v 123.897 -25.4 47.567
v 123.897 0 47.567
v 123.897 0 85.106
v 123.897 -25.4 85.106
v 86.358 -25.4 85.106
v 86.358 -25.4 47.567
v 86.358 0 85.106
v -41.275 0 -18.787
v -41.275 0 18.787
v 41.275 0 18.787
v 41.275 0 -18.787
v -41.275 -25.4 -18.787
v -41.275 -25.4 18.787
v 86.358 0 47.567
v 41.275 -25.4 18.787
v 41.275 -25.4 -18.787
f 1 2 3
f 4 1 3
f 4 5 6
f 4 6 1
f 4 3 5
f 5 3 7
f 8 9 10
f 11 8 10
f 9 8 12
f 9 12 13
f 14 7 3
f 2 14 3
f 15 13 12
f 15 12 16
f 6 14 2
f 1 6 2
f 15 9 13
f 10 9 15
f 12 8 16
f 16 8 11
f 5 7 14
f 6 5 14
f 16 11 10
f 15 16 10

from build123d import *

# Parameters (mm, degrees)
F0_W     = 82.55
F0_H     = 37.573908
F1_DEPTH = 25.4


with BuildPart() as f1:
    # F0 (on Front) → F1 (new body)
    with BuildSketch(Plane.XZ):
        Polygon((86.357945, 85.106038), (86.357945, 56.326063), (86.357945, 47.566941), (123.897101, 47.566941), (123.897101, 85.106038), align=None)
        Rectangle(F0_W, F0_H)
    extrude(amount=F1_DEPTH)


solid = f1.part
